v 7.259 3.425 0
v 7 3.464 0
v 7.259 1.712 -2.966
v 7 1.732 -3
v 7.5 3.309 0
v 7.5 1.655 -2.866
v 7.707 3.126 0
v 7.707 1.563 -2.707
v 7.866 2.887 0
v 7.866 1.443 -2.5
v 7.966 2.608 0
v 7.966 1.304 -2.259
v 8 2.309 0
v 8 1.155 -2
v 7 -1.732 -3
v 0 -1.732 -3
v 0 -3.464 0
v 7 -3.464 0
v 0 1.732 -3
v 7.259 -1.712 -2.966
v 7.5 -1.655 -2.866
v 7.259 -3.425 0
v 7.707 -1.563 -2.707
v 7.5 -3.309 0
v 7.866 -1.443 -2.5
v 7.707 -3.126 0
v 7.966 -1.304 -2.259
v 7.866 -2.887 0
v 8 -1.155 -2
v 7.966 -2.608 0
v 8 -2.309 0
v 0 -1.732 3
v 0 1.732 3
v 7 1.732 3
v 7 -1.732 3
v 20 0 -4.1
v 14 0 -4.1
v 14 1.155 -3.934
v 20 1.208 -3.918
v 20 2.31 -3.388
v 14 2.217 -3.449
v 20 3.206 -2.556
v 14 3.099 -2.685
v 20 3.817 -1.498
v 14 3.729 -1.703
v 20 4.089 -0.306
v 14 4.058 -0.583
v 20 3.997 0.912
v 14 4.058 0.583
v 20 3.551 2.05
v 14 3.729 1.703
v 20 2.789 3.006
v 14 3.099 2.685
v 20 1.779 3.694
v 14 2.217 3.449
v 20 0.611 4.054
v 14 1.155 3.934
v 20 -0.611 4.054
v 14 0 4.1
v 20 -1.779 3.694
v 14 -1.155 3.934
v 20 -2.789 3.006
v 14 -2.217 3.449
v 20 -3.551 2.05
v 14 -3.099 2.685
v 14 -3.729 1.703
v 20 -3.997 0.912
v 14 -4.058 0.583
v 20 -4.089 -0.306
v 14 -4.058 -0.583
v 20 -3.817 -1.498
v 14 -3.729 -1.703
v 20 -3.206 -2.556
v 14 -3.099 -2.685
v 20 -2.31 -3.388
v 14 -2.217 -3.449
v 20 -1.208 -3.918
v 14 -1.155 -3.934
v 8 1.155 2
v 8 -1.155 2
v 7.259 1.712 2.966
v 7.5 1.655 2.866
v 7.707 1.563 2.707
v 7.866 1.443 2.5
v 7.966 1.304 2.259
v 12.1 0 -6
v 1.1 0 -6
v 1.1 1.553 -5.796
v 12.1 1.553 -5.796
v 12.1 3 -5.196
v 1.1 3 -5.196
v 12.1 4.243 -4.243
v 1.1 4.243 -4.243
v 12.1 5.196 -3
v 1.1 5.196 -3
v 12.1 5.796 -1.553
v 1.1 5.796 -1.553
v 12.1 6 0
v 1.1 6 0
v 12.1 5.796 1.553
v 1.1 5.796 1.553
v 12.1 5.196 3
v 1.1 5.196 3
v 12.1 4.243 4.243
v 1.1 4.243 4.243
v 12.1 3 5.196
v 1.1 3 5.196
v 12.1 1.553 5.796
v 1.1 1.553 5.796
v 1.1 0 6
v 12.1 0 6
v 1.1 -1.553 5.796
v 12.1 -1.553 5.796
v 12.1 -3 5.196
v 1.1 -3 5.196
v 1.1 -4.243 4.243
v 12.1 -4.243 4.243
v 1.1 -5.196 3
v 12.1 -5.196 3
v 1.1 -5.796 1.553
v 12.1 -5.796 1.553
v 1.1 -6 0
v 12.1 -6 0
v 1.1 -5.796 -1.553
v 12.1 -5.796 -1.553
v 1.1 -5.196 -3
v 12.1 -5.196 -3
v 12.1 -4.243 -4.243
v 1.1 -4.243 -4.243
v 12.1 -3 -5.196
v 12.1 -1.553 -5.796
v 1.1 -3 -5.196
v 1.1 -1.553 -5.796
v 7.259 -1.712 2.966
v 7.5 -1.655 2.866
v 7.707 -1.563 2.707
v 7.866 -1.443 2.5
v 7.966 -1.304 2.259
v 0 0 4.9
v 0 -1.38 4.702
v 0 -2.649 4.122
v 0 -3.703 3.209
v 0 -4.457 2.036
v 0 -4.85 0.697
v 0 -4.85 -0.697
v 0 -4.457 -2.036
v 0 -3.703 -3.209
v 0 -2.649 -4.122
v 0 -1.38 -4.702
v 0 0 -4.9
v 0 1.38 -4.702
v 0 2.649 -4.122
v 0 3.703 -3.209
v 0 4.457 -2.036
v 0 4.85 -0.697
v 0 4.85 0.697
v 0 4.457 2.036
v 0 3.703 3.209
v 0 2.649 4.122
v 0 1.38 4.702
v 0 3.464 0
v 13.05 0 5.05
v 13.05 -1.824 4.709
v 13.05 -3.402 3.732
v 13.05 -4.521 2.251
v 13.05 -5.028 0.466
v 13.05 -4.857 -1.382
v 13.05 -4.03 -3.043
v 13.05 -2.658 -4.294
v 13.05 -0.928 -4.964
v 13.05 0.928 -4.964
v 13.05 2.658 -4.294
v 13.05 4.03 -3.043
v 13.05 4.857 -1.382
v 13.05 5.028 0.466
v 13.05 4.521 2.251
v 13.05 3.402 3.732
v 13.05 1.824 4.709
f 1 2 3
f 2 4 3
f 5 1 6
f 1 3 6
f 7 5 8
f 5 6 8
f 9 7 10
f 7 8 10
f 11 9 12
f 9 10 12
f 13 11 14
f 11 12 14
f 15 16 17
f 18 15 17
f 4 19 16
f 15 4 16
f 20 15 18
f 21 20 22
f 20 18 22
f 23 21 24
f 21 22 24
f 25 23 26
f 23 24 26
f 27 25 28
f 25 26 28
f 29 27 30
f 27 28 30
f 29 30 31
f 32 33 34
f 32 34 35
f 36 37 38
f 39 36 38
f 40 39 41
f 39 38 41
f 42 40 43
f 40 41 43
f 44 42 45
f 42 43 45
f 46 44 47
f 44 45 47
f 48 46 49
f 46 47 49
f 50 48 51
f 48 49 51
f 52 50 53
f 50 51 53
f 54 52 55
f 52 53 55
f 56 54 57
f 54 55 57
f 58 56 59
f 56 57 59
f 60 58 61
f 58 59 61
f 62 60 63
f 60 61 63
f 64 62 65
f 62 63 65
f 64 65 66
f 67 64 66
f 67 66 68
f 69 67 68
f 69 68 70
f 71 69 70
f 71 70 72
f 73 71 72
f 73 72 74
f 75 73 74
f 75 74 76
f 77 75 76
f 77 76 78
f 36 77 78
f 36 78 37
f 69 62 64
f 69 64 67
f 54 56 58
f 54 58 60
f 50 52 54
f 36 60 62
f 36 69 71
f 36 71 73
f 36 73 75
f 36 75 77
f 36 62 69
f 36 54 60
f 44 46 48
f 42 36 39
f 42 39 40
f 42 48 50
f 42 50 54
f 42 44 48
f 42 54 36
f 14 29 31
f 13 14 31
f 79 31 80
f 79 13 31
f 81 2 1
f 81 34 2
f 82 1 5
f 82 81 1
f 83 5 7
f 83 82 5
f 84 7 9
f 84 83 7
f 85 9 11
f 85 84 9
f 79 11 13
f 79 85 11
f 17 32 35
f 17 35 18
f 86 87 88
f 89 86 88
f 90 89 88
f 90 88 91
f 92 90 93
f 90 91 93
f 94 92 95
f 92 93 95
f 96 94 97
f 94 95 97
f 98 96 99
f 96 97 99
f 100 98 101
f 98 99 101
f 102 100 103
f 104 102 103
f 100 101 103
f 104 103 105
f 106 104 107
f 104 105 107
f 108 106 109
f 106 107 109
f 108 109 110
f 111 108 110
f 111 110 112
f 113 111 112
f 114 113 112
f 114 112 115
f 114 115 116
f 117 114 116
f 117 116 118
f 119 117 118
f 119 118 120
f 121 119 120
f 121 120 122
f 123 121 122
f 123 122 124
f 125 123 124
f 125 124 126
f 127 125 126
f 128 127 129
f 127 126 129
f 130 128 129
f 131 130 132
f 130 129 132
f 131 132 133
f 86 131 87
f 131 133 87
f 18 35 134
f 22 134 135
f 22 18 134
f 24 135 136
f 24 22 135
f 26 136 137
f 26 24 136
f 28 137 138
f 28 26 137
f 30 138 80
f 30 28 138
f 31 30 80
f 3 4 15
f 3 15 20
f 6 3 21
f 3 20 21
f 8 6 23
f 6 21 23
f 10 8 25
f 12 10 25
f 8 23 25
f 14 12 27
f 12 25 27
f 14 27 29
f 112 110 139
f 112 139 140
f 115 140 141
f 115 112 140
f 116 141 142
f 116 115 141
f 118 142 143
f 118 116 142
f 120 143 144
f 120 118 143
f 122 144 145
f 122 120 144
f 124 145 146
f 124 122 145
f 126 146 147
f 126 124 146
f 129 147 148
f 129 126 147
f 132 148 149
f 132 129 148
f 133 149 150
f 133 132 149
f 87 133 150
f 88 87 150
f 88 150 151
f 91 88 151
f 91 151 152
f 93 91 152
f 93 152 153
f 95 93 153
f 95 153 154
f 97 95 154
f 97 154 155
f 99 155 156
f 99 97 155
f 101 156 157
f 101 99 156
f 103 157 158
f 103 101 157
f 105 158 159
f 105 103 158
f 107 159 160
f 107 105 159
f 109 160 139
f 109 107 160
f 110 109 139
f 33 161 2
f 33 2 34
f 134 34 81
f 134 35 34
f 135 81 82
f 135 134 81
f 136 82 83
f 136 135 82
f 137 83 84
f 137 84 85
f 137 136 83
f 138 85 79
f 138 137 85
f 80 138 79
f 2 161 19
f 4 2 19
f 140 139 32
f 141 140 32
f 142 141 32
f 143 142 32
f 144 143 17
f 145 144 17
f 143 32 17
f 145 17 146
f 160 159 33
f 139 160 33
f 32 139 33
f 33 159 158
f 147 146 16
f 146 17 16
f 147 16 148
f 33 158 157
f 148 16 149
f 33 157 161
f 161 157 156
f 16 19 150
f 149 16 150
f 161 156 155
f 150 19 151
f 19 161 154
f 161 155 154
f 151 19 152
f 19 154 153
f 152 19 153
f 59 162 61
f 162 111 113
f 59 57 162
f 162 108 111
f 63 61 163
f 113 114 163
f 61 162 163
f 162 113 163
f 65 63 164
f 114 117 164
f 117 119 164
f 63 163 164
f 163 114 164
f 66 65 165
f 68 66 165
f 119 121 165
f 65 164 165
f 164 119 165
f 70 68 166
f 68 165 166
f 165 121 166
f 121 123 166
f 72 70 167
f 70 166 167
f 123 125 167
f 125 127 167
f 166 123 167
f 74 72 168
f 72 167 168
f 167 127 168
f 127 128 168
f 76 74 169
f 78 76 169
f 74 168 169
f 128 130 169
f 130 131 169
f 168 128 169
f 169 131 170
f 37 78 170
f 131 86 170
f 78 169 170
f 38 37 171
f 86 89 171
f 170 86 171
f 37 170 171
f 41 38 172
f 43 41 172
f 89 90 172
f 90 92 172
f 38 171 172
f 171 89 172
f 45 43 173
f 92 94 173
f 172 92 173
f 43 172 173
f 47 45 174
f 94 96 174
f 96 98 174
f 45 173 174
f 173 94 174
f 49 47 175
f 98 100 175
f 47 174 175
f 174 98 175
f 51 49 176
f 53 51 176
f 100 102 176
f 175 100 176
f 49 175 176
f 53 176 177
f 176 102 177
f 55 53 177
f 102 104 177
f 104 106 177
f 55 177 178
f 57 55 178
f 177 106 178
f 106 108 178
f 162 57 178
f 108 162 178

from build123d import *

# Parameters (mm, degrees)
SKETCH_1_R          = 6
EXTRUDE_1_DEPTH     = 20
CUT_EXTRUDE_1_DEPTH = 8
CUT_EXTRUDE_START   = -6
SKETCH_3_R          = 6
SKETCH_3_R_2        = 4.1
CUT_EXTRUDE_2_DEPTH = 6
FILLET_1_R          = 1


with BuildPart() as part:
    # Эскиз1 → Вытянуть1 (new body)
    with BuildSketch(Plane(origin=(0, 0, 0), x_dir=(0, 0, -1), z_dir=(1, 0, 0))):
        Circle(SKETCH_1_R)
    extrude(amount=EXTRUDE_1_DEPTH)

    # Эскиз2 → Вырез-Вытянуть1 (cut)
    with BuildSketch(Plane.ZY):
        Polygon((-3, -1.732050808), (0, -3.464101615), (0, 3.464101615), (-3, 1.732050808), align=None)
        Polygon((0, -3.464101615), (0, 3.464101615), (3, 1.732050808), (3, -1.732050808), align=None)
    extrude(amount=-CUT_EXTRUDE_1_DEPTH, mode=Mode.SUBTRACT)

    # Эскиз3 → Вырез-Вытянуть2 (cut)
    with BuildSketch(Plane(origin=(20, 0, 0), x_dir=(0, 0, -1), z_dir=(1, 0, 0)).offset(CUT_EXTRUDE_START)):
        Circle(SKETCH_3_R)
        Circle(SKETCH_3_R_2, mode=Mode.SUBTRACT)
    extrude(amount=CUT_EXTRUDE_2_DEPTH, mode=Mode.SUBTRACT)

    # Эскиз4 → Вырез-Повернуть1 (revolve, cut)
    with BuildSketch(Plane.XY, mode=Mode.PRIVATE) as cut_revolve_1_sk:
        Polygon((14, 6), (14, 4.1), (12.1, 6), align=None)
    revolve(cut_revolve_1_sk.sketch.rotate(Axis((0, 0, 0), (1, 0, 0)), 90), axis=Axis((0, 0, 0), (1, 0, 0)), mode=Mode.SUBTRACT)

    # Эскиз5 → Вырез-Повернуть2 (revolve, cut)
    with BuildSketch(Plane.XY, mode=Mode.PRIVATE) as cut_revolve_2_sk:
        Polygon((0, 6), (0, 4.9), (1.1, 6), align=None)
    revolve(cut_revolve_2_sk.sketch.rotate(Axis((0, 0, 0), (1, 0, 0)), 90), axis=Axis((0, 0, 0), (1, 0, 0)), mode=Mode.SUBTRACT)

    # Скругление1
    fillet_1_edges = [part.edges().sort_by_distance(p)[0] for p in [
        (8, -2.598076211, 1.5),
        (8, -2.598076211, -1.5),
        (8, 0, -3),
        (8, 2.598076211, -1.5),
        (8, 2.598076211, 1.5),
        (8, 0, 3),
    ]]
    fillet(fillet_1_edges, radius=FILLET_1_R)


solid = part.part
